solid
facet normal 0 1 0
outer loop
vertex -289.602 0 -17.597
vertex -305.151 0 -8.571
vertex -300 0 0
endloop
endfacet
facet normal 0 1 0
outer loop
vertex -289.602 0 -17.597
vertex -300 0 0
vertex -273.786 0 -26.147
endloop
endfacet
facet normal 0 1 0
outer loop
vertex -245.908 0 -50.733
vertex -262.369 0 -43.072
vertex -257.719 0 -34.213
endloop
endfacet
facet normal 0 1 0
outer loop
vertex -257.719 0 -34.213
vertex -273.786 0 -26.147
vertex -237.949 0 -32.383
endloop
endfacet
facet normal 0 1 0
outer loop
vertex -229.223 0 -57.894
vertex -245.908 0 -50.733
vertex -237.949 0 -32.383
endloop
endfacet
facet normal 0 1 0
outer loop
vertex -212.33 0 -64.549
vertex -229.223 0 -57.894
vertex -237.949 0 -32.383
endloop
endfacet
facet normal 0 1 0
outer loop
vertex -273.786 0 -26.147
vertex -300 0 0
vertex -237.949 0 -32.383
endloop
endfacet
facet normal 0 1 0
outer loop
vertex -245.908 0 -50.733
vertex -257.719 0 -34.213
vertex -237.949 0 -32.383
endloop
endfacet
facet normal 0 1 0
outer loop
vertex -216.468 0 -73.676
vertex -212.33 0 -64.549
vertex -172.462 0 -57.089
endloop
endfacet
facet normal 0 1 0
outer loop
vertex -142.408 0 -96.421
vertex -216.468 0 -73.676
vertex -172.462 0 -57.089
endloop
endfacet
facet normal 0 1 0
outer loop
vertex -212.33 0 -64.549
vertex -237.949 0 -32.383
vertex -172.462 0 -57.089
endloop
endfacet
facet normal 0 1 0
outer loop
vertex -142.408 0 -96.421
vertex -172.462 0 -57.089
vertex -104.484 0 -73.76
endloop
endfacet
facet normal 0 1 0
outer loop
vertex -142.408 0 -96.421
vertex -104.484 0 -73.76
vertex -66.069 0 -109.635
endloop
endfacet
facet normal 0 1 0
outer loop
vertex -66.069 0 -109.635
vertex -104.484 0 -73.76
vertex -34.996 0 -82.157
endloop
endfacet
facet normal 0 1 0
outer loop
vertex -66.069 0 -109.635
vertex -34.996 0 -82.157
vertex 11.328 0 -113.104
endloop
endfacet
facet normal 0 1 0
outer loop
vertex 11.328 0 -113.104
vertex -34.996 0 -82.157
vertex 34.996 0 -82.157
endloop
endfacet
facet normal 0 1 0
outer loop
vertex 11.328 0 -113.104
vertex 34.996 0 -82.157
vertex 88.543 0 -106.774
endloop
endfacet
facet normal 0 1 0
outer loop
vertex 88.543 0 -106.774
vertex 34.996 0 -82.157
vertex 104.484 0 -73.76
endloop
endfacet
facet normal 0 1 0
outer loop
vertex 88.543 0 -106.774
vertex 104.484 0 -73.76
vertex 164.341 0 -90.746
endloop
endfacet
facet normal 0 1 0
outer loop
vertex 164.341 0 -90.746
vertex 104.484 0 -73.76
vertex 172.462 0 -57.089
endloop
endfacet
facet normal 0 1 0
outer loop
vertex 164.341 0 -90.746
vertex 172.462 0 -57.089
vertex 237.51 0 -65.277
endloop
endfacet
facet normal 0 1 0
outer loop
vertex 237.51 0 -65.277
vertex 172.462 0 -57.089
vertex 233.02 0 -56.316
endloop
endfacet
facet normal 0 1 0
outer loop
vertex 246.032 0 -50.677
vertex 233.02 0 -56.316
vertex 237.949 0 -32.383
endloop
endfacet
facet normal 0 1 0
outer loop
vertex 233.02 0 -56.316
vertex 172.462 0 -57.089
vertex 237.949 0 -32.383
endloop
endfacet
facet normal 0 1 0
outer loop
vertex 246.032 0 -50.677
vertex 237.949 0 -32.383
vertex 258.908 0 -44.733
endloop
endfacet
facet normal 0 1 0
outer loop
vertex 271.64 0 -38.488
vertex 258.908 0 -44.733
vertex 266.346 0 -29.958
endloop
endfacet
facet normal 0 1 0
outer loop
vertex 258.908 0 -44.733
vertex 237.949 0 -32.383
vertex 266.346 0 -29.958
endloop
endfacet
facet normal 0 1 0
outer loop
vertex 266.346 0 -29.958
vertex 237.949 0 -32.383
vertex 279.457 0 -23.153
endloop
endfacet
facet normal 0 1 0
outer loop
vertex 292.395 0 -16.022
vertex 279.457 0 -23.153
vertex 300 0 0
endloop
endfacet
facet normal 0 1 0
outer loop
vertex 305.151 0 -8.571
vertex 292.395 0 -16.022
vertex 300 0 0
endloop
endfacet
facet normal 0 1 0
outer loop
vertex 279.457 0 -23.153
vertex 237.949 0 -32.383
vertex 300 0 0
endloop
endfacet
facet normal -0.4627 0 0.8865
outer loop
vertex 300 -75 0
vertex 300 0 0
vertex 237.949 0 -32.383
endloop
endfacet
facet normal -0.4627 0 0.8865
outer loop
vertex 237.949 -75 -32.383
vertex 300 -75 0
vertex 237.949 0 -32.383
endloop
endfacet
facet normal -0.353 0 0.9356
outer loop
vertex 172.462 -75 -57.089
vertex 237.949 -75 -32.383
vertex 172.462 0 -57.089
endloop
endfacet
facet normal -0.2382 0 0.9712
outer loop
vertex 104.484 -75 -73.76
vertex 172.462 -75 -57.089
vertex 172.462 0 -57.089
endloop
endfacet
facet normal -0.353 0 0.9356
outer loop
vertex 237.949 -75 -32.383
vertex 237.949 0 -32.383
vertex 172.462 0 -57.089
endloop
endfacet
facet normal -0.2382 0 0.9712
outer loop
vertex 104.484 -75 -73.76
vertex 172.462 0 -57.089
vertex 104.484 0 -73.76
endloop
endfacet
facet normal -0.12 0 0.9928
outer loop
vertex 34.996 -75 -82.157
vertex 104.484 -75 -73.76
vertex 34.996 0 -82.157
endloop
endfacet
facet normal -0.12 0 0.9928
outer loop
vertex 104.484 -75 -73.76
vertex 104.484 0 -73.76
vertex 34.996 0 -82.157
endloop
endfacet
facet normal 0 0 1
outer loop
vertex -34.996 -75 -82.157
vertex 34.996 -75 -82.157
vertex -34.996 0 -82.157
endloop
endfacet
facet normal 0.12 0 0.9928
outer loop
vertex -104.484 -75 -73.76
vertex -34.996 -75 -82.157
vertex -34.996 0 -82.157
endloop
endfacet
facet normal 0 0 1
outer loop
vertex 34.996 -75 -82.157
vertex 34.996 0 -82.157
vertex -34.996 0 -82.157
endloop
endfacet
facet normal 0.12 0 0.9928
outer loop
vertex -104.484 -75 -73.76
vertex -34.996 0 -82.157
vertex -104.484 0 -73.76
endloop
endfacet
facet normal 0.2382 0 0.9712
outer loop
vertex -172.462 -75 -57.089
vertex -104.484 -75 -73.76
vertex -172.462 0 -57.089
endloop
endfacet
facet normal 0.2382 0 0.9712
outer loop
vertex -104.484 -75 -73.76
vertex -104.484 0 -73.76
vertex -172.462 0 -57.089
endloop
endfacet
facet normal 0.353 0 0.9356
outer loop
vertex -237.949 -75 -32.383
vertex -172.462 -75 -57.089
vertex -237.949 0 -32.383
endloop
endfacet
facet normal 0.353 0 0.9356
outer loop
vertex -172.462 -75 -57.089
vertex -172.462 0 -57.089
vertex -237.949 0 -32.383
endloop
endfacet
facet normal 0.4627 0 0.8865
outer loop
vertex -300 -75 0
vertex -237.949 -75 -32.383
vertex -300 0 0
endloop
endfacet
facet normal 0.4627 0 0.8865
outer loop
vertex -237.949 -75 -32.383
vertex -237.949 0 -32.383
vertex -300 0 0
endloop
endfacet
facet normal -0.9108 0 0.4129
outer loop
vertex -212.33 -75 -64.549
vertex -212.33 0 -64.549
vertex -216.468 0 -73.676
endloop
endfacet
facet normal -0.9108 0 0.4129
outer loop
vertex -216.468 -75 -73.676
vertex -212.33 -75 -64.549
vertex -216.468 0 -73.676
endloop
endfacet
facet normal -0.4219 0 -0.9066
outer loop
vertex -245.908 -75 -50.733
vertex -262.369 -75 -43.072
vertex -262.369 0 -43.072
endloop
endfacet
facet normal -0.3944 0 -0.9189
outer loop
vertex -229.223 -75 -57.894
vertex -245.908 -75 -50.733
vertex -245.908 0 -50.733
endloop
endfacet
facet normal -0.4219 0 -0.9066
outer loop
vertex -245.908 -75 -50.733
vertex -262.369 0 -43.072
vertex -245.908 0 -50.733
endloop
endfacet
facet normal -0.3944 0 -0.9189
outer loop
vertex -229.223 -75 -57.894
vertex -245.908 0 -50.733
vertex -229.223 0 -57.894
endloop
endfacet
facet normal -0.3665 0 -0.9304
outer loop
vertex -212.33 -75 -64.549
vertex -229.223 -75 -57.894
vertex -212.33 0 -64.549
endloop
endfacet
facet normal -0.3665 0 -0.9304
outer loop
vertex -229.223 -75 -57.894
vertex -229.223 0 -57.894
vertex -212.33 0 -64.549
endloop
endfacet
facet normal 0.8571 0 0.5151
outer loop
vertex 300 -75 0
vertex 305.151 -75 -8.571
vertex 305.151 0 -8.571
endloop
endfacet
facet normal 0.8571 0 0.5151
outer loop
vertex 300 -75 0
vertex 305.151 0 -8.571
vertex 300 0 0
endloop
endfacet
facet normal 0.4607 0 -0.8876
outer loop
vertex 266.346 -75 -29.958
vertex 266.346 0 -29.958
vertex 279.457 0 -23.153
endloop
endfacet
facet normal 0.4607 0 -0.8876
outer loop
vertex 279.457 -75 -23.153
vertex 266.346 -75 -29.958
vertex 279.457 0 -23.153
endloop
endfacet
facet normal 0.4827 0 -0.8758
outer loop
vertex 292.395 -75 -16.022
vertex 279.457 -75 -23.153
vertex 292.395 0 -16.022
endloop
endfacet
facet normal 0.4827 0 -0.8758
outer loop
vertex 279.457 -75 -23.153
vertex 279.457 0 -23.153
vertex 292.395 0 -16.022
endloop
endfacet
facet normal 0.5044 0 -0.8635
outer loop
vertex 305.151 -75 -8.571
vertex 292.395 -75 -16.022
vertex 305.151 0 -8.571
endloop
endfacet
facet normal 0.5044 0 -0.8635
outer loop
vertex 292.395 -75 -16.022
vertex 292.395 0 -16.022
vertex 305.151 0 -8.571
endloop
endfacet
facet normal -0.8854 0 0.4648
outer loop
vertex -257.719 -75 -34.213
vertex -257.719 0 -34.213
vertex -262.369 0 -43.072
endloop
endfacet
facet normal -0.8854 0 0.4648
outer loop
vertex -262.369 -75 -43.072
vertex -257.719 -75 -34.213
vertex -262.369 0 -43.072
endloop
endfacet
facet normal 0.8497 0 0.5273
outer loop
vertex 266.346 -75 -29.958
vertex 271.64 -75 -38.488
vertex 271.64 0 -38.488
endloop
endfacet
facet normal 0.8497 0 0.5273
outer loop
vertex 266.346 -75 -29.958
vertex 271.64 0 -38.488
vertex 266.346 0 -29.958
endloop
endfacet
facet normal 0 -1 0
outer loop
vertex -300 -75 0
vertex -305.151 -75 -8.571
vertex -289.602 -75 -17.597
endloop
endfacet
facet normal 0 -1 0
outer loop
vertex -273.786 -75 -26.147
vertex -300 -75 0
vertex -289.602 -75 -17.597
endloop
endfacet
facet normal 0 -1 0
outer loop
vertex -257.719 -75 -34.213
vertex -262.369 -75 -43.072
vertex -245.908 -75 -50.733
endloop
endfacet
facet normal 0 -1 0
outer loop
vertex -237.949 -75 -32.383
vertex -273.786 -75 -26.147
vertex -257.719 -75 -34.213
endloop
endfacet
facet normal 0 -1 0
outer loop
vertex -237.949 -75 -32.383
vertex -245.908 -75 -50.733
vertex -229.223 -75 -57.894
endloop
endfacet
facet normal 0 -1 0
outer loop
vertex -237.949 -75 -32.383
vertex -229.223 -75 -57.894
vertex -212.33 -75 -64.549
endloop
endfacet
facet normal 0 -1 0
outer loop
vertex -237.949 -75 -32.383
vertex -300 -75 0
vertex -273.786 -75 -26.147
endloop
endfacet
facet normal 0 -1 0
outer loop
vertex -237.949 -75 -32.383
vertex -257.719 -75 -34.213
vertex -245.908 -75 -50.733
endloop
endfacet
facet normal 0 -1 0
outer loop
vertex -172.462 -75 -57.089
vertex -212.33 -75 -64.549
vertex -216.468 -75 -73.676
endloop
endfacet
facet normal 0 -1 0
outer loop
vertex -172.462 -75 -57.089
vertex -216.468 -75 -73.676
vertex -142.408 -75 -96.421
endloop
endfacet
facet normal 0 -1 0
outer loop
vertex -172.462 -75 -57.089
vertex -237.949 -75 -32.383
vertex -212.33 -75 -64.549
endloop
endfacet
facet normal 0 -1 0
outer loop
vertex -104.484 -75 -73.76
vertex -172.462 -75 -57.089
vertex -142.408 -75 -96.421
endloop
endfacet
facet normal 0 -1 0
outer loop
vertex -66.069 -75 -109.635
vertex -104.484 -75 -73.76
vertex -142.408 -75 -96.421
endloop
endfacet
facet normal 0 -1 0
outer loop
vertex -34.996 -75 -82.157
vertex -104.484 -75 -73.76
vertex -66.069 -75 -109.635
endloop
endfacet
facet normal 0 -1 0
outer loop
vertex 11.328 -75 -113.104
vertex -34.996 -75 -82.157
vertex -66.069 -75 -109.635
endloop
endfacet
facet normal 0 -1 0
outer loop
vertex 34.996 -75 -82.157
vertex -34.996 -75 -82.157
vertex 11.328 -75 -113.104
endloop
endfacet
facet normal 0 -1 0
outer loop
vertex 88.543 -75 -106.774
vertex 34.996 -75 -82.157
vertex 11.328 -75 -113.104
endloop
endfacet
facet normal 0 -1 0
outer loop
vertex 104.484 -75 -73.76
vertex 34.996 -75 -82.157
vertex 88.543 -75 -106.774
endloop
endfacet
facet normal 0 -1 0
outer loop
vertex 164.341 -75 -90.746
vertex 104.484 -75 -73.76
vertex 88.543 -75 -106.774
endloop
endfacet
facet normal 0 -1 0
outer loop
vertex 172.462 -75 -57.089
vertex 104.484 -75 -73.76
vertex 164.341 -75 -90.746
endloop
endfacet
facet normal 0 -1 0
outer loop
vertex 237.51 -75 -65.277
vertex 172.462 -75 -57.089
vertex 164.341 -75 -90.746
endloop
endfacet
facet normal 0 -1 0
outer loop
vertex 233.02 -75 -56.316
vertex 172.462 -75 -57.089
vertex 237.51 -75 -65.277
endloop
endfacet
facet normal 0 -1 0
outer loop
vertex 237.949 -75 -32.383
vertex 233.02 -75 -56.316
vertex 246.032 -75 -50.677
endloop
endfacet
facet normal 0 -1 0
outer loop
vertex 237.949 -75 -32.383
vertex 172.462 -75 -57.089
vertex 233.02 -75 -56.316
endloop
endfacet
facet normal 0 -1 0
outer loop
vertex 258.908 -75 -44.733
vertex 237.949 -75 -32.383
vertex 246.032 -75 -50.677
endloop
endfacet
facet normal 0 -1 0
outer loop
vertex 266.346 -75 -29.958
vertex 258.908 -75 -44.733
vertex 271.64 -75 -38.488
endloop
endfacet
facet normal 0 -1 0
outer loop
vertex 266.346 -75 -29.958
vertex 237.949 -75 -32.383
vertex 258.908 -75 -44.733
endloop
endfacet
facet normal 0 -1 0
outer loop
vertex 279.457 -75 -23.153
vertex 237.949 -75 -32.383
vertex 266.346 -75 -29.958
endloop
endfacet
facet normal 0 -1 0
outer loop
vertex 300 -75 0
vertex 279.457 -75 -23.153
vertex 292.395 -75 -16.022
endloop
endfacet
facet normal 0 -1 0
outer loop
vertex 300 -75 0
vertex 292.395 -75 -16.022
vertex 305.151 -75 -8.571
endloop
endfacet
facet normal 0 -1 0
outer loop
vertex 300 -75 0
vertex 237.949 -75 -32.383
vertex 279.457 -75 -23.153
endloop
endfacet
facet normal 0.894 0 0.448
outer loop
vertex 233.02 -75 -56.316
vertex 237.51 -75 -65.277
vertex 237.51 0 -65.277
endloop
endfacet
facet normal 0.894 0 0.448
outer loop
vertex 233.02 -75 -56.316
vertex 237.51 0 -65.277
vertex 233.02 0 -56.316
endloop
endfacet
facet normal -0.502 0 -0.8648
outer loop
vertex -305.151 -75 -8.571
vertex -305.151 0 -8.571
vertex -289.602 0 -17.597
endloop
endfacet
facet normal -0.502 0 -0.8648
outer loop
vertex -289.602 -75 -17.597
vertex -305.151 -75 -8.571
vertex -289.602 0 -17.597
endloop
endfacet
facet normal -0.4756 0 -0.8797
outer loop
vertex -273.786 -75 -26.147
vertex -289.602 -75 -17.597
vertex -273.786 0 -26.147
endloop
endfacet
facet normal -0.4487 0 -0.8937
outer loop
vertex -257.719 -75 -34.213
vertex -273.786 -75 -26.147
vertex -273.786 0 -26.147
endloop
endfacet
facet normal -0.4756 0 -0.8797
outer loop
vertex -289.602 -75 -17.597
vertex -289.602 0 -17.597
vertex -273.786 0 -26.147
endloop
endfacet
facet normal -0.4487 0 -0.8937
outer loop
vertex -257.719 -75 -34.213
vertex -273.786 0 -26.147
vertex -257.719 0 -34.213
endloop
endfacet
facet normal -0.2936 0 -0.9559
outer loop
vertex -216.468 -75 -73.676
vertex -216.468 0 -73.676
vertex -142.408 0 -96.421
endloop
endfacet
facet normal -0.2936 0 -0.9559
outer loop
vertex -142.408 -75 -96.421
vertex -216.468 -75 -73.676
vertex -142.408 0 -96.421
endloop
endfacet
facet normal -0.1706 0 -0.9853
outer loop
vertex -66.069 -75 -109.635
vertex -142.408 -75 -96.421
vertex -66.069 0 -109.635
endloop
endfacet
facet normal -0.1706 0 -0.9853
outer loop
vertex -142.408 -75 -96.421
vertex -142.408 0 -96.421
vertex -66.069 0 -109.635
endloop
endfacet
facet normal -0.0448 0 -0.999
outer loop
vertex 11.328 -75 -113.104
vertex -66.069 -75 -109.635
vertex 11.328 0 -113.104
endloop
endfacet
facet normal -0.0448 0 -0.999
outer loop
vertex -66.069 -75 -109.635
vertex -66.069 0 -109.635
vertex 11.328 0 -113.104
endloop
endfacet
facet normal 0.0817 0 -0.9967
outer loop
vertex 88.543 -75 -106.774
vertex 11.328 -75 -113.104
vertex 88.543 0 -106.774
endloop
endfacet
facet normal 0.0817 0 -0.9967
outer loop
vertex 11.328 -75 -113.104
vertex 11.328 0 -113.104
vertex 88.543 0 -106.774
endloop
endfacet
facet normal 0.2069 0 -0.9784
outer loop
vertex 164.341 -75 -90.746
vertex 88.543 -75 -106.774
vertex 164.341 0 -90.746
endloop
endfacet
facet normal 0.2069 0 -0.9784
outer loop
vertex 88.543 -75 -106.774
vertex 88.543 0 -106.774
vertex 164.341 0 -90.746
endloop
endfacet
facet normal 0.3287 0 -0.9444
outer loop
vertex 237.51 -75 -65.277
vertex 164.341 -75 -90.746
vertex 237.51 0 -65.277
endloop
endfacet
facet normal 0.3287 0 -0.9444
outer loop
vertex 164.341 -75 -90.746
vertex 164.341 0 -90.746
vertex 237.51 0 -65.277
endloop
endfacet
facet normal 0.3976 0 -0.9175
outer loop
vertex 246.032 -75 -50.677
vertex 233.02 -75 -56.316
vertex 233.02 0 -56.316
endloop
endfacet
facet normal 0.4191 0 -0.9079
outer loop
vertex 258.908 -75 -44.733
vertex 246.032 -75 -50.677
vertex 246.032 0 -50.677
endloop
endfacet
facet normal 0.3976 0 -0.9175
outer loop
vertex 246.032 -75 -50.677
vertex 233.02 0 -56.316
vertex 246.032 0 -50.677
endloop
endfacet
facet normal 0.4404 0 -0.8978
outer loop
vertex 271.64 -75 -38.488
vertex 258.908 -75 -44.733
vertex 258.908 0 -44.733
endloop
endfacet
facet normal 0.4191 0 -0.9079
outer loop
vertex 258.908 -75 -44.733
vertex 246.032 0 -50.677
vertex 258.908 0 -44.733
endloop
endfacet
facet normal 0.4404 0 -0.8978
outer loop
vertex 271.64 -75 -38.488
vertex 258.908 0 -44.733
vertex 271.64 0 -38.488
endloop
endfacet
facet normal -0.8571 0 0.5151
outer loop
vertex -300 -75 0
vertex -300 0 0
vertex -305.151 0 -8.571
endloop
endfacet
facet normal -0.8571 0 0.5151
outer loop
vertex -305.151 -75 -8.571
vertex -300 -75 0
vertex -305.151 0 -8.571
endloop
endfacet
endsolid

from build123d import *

# Parameters (mm, degrees)
F1_DEPTH = 75


with BuildPart() as f1:
    # F0 (on Front) → F1 (new body)
    with BuildSketch(Plane.XZ):
        with BuildLine():
            ThreePointArc((233.020331, -56.316324), (11.13377, -103.106166), (-212.330451, -64.54871))
            Line((-212.330451, -64.54871), (-216.468156, -73.675685))
            ThreePointArc((-216.468156, -73.675685), (11.327825, -113.104287), (237.509549, -65.27698))
            Line((237.509549, -65.27698), (233.020331, -56.316324))
        make_face()
        with BuildLine():
            ThreePointArc((266.345782, -29.958453), (4.809679, -93.189537), (-257.718636, -34.213378))
            Line((-257.718636, -34.213378), (-262.368917, -43.072499))
            ThreePointArc((-262.368917, -43.072499), (-237.592465, -54.376272), (-212.330451, -64.54871))
            ThreePointArc((-212.330451, -64.54871), (11.13377, -103.106166), (233.020331, -56.316324))
            ThreePointArc((233.020331, -56.316324), (252.487762, -47.743164), (271.64038, -38.488046))
            Line((271.64038, -38.488046), (266.345782, -29.958453))
        make_face()
        with BuildLine():
            ThreePointArc((300, 0), (0, -83.209062), (-300, 0))
            Line((-300, 0), (-305.151002, -8.5713))
            ThreePointArc((-305.151002, -8.5713), (-281.726705, -21.932266), (-257.718636, -34.213378))
            ThreePointArc((-257.718636, -34.213378), (4.809679, -93.189537), (266.345782, -29.958453))
            ThreePointArc((266.345782, -29.958453), (285.948415, -19.627802), (305.151002, -8.5713))
            Line((305.151002, -8.5713), (300, 0))
        make_face()
    extrude(amount=F1_DEPTH)


solid = f1.part
